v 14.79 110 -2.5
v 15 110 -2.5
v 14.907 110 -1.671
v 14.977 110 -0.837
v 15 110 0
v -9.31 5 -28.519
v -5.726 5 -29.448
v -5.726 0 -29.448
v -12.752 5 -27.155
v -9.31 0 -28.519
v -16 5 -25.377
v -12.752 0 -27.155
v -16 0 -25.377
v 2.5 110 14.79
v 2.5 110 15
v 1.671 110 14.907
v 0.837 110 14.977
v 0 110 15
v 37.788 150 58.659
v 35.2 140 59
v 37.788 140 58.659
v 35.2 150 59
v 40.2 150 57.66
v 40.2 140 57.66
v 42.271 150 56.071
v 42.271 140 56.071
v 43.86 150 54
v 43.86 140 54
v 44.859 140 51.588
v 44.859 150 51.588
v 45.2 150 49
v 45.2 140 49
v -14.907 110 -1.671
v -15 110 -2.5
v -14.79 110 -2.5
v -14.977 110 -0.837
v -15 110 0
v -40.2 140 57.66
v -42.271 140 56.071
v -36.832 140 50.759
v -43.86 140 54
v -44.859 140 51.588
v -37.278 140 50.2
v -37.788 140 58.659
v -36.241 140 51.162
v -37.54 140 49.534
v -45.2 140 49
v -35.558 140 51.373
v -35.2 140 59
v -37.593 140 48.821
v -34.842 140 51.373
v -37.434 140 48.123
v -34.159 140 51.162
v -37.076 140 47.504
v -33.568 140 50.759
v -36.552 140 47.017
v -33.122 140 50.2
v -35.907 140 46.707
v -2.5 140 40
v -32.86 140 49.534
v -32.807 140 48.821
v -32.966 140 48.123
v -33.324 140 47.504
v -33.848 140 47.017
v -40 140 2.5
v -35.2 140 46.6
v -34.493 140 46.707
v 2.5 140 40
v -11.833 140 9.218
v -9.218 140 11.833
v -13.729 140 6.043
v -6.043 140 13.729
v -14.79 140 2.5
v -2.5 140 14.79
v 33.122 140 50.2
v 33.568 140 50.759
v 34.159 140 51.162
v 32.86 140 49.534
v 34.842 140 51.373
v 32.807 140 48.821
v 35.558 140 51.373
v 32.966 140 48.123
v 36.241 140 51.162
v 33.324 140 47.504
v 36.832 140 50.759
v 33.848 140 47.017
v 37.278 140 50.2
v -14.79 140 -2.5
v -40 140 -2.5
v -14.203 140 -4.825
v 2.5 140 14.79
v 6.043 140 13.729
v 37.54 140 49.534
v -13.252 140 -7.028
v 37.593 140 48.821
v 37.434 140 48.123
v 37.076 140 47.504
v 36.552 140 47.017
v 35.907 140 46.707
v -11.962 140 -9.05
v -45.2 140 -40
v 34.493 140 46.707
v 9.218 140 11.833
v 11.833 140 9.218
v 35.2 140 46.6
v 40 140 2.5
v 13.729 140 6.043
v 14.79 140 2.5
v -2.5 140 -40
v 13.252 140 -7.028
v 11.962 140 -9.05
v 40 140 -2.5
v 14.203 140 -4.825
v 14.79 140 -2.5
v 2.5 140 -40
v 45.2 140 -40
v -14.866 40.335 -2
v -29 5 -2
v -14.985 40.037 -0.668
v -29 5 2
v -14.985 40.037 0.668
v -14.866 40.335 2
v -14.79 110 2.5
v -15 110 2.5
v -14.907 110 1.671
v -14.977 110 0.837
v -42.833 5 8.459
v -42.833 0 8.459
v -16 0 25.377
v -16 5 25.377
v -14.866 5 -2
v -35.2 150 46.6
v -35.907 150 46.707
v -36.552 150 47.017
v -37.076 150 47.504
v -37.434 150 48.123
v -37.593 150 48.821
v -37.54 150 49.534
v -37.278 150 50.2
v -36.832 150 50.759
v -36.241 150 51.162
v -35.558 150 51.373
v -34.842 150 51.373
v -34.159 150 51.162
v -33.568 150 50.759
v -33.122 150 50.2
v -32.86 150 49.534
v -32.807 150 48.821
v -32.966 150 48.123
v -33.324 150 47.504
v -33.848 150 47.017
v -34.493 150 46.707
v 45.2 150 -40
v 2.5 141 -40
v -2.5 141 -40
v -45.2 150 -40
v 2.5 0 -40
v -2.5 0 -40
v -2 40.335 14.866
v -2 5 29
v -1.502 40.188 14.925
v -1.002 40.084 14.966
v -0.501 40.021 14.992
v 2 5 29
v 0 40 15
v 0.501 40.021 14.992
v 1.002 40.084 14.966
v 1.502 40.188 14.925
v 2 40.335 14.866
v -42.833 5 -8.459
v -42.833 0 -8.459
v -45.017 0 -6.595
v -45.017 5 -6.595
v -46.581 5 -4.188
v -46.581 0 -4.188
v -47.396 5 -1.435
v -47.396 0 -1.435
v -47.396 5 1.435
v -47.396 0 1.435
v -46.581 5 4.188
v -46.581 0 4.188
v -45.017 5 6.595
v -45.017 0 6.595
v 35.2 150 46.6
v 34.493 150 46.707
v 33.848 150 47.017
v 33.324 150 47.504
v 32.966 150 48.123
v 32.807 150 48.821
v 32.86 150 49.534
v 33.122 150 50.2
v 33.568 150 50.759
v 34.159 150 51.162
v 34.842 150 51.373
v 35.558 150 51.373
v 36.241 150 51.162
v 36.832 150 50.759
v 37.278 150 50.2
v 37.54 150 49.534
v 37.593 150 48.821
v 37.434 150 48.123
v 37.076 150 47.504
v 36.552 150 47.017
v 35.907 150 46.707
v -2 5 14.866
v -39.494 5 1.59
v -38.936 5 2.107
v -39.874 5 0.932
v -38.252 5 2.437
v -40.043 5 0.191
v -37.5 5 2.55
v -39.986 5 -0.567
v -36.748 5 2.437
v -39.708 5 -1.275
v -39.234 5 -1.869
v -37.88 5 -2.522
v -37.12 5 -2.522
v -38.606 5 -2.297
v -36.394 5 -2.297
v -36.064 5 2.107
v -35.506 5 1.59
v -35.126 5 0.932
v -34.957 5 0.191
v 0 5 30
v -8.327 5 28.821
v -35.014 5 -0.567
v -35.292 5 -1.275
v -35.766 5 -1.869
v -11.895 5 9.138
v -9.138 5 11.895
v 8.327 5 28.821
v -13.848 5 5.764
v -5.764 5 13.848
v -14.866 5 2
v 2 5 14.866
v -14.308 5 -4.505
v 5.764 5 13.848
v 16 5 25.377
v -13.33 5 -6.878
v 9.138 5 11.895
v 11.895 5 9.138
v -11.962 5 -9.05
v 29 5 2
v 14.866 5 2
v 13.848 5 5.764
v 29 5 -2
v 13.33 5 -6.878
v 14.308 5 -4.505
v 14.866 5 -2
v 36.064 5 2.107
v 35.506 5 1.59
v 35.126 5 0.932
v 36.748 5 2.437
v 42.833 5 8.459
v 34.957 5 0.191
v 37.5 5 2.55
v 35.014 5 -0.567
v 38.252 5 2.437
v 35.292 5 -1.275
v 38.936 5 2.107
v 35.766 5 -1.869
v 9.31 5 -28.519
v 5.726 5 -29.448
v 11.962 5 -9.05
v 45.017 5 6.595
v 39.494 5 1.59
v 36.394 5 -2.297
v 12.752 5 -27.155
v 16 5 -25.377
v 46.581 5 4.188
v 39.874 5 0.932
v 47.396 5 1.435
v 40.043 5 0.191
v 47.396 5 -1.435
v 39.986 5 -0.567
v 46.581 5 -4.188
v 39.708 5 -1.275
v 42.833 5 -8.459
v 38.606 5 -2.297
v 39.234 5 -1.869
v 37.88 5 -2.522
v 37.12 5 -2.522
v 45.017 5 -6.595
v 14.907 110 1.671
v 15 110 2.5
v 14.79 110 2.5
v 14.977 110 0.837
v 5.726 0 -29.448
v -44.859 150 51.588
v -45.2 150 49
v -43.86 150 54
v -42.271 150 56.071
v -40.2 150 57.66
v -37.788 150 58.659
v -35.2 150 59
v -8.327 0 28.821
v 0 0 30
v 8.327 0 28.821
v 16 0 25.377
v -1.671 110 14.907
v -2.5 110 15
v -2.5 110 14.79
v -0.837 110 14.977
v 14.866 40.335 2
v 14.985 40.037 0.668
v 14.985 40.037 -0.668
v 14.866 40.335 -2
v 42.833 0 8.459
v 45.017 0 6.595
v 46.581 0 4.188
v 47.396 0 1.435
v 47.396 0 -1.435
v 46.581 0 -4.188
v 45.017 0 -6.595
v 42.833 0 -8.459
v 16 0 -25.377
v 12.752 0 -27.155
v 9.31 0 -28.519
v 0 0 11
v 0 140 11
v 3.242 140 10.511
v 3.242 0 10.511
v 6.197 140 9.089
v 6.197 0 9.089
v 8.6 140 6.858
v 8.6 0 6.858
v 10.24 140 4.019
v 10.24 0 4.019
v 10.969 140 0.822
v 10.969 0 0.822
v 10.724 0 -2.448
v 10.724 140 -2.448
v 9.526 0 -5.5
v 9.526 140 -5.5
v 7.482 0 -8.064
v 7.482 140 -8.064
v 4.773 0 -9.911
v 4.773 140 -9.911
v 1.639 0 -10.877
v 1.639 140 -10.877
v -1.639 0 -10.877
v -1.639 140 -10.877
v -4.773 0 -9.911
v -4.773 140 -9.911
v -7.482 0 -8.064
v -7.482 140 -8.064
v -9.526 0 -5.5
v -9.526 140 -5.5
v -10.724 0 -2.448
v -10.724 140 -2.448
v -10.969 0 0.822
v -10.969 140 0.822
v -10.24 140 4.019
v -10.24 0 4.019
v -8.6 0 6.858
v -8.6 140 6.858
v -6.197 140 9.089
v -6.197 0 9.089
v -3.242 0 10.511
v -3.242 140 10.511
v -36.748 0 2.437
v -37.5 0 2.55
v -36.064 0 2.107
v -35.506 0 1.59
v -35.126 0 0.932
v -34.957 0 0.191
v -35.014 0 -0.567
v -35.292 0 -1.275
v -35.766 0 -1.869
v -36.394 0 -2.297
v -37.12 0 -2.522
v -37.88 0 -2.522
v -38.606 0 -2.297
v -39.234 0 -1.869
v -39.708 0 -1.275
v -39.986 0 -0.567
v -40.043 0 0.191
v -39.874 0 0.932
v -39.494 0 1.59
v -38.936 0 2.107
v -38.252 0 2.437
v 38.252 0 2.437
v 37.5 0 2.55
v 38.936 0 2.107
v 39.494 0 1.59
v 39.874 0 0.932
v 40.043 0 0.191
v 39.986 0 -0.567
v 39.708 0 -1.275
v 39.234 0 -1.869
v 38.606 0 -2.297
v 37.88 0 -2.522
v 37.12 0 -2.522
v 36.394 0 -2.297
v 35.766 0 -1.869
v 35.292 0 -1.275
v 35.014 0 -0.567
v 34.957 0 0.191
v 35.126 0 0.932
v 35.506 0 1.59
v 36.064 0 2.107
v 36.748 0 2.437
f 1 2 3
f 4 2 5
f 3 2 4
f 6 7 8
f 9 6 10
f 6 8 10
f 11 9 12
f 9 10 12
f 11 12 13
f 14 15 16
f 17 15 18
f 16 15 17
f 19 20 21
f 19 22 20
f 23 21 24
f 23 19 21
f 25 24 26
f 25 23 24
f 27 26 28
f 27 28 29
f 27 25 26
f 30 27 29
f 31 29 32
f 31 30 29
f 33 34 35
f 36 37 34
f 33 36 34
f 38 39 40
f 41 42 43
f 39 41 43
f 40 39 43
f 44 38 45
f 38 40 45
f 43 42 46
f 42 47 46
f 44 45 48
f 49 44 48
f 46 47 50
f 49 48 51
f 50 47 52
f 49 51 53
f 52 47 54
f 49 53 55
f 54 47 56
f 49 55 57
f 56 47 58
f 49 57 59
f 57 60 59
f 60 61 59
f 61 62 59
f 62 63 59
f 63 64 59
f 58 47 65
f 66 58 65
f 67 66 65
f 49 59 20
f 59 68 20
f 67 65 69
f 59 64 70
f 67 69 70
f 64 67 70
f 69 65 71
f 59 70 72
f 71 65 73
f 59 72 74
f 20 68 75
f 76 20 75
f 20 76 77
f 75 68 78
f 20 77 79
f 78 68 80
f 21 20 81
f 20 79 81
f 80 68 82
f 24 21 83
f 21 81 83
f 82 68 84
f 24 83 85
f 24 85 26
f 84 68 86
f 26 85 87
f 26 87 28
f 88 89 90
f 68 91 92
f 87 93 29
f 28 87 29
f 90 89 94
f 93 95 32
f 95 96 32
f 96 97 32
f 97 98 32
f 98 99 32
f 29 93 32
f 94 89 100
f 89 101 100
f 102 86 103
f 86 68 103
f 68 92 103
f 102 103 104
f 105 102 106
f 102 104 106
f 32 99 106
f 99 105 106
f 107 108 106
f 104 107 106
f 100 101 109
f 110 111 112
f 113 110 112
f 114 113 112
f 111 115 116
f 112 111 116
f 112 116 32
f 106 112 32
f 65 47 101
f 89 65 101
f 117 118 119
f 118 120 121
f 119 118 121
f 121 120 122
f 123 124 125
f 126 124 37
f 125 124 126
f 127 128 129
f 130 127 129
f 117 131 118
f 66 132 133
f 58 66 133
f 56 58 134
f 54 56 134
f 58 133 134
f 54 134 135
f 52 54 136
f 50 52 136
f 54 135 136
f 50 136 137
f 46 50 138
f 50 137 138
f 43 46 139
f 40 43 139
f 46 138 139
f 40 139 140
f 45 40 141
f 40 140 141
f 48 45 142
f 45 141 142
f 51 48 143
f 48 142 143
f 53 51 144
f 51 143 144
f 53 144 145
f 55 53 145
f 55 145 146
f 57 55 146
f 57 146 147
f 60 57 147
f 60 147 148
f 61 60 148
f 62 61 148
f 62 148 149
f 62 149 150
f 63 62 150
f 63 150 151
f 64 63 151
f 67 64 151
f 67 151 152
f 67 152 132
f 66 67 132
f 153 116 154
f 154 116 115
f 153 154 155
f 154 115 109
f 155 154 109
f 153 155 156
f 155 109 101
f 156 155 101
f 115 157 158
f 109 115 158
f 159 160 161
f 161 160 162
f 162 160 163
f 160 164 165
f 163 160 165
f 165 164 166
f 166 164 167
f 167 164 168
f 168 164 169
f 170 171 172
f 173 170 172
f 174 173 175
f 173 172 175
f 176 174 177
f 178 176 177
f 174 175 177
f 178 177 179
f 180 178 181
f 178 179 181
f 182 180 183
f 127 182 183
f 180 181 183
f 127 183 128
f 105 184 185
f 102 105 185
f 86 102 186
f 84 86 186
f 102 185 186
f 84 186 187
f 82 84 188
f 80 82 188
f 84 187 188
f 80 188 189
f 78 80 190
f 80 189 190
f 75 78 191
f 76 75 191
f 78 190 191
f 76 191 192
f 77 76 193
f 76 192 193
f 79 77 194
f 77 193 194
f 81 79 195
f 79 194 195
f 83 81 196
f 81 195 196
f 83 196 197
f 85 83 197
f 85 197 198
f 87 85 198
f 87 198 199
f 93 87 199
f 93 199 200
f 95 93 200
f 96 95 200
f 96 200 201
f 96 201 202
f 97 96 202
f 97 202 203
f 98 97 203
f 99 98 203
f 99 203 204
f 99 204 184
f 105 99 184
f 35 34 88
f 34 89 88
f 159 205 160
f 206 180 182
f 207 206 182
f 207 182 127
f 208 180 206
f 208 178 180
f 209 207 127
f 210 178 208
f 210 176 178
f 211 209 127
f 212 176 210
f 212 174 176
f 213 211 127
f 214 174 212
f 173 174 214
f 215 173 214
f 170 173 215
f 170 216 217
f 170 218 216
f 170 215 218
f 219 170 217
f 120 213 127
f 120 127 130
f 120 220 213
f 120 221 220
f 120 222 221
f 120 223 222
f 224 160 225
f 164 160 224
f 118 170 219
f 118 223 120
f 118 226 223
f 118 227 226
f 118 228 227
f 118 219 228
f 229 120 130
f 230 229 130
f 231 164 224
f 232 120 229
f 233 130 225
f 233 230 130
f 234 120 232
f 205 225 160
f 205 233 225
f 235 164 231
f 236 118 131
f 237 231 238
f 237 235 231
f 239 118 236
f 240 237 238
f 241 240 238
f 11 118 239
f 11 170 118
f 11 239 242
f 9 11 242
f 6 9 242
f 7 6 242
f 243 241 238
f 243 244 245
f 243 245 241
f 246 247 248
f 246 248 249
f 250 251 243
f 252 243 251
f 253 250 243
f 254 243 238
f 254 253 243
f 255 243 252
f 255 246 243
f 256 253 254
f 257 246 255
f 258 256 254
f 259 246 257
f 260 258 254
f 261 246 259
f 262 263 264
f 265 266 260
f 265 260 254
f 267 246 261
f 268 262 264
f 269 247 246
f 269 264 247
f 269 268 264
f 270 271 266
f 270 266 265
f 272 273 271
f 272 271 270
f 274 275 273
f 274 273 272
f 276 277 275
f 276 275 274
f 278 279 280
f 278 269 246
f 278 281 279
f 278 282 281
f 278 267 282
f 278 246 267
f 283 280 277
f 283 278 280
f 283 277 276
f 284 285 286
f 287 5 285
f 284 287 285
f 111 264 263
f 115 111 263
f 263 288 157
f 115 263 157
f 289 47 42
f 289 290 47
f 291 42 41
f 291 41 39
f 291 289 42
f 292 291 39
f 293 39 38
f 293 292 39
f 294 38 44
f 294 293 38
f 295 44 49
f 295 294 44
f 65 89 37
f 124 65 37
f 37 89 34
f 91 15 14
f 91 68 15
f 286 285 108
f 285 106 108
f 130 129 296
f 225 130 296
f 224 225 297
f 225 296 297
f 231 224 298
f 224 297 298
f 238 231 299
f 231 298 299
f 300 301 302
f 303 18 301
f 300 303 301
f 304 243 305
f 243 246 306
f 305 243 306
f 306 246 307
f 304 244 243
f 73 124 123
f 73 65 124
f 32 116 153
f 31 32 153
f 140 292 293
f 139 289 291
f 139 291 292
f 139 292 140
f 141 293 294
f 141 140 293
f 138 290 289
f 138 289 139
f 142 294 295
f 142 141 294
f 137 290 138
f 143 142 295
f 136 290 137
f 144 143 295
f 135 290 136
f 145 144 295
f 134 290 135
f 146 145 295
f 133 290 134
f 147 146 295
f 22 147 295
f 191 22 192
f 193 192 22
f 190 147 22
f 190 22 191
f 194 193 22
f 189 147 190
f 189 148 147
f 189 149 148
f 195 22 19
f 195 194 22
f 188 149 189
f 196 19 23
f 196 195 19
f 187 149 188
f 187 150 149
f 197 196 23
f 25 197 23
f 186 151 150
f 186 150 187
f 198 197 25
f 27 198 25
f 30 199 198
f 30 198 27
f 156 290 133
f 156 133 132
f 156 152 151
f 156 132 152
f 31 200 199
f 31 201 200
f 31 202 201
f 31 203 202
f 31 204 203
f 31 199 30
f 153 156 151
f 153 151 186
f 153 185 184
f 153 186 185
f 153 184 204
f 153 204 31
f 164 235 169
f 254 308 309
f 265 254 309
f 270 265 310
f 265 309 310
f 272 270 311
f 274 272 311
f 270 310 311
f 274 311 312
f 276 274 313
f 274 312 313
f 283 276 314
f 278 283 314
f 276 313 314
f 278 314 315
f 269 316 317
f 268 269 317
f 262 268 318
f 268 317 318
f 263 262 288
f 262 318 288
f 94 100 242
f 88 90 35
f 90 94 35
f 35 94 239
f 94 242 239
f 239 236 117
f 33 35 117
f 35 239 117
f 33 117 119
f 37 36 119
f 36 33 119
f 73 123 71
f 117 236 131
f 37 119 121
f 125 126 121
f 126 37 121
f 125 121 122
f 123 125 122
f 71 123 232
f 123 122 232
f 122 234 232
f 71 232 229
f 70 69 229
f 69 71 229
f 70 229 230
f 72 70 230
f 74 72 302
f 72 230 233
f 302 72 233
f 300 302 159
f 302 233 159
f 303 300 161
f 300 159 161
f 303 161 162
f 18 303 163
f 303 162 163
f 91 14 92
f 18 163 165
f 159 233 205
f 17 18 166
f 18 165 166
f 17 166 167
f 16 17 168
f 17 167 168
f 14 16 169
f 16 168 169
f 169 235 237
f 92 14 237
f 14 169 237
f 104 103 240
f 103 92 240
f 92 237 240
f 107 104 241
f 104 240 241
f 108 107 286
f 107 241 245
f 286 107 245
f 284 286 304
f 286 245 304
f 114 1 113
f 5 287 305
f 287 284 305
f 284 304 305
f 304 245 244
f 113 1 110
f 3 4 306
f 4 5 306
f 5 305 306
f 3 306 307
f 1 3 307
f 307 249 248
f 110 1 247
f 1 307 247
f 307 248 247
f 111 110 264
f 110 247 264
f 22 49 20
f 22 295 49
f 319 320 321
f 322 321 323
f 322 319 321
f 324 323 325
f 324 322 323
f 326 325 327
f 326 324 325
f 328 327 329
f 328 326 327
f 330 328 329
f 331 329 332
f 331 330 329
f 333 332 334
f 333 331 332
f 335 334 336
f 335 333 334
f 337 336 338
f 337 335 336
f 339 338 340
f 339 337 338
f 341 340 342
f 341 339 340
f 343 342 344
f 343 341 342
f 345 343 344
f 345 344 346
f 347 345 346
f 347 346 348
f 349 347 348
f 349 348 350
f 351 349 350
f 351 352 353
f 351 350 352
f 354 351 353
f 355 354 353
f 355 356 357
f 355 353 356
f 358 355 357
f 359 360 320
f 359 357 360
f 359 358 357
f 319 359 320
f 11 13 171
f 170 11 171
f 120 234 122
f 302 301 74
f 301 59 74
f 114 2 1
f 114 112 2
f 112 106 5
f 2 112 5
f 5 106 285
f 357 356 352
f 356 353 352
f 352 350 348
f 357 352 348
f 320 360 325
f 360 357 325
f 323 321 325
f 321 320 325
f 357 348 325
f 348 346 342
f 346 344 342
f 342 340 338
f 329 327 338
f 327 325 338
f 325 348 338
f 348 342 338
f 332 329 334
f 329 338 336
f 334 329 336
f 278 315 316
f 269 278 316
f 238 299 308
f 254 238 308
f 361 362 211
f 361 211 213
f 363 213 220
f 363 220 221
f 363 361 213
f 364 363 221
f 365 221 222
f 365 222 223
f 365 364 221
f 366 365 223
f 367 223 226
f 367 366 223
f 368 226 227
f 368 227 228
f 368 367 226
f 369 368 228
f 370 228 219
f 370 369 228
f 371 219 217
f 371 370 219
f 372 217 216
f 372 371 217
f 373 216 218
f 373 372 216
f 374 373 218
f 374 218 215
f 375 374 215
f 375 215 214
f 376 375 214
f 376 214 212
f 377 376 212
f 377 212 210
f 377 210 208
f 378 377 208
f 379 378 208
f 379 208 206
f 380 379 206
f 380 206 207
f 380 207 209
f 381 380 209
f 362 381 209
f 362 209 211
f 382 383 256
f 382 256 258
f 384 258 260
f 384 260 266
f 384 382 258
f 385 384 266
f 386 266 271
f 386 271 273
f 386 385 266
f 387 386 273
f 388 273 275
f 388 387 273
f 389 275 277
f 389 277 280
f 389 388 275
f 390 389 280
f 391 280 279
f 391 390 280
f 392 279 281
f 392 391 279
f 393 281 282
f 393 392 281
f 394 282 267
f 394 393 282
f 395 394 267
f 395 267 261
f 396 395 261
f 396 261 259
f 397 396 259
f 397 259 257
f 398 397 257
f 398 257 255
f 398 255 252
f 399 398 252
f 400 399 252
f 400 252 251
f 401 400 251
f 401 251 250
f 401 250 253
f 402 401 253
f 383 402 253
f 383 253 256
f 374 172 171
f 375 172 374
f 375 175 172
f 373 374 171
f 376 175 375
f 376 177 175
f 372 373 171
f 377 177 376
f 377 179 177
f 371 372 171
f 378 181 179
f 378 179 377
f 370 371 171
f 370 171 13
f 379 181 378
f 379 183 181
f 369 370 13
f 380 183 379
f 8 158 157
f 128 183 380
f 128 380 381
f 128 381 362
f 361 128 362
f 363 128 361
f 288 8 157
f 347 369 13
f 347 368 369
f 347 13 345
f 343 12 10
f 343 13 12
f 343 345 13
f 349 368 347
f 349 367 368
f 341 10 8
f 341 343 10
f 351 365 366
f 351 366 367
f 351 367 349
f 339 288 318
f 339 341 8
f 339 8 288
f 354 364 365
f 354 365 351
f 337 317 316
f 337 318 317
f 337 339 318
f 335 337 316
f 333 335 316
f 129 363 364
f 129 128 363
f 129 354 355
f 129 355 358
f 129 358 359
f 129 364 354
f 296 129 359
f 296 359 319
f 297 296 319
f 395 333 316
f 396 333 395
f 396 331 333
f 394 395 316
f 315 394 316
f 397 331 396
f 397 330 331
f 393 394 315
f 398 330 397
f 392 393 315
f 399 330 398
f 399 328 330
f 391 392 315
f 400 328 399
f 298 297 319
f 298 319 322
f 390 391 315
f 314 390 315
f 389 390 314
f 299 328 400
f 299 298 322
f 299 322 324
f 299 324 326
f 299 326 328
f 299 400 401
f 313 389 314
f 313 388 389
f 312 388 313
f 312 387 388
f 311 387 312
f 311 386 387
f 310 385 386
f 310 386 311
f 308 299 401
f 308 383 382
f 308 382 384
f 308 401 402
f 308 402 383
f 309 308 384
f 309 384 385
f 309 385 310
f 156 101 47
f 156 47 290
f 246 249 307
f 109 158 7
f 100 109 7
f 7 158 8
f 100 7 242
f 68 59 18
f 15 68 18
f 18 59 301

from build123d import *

# Parameters (mm, degrees)
SKETCH1_R                      = 2.55
SKETCH1_R_2                    = 11
BASE_DEPTH                     = 5
SKETCH1_3_R                    = 15
SKETCH1_3_R_2                  = 11
STEM_DEPTH                     = 150
RIBS_DEPTH                     = 2
CIRPATTERN1_COUNT              = 4
SKETCH4_W                      = 90.4
SKETCH4_H                      = 80
TOP_PLATE_DEPTH                = 10
SKETCH6_W                      = 90.4
SKETCH6_H                      = 10
BOSS_EXTRUDE7_DEPTH            = 19
RIB1_START                     = -2.5
RIB1_DEPTH                     = 5
CIRPATTERN6_COUNT              = 4
CUT_EXTRUDE1_REACH             = 170.039
SKETCH10_R                     = 2.4
CUT_EXTRUDE1_DIRECTION_2_DEPTH = 169.039429897
FILLET1_R                      = 10
FILLET2_R                      = 10
SKETCH13_W                     = 5
SKETCH13_H                     = 25.209800542
BOSS_EXTRUDE10_DEPTH           = 140
BOSS_EXTRUDE11_DEPTH           = 141
BOSS_EXTRUDE11_START           = -9.462383487
BOSS_EXTRUDE11_2_DEPTH         = 9.462383487
BOSS_EXTRUDE11_START_2         = -22
BOSS_EXTRUDE11_3_OUTLINE_W     = 26
BOSS_EXTRUDE11_3_OUTLINE_H     = 36
BOSS_EXTRUDE11_3_DEPTH         = 10.305131811
SKETCH16_W                     = 125.849741583
SKETCH16_H                     = 86.760976346
CUT_EXTRUDE2_DEPTH             = 169.039429897


with BuildPart() as part:
    # Sketch1 → base (new body)
    with BuildSketch(Plane(origin=(0, 0, 0), x_dir=(1, 0, 0), z_dir=(0, 1, 0))):
        with BuildLine():
            Line((-16, 25.377155081), (-42.833333333, 8.459051694))
            ThreePointArc((-42.833333333, 8.459051694), (-47.5, 0), (-42.833333333, -8.459051694))
            Line((-42.833333333, -8.459051694), (-16, -25.377155081))
            ThreePointArc((-16, -25.377155081), (0, -30), (16, -25.377155081))
            Line((16, -25.377155081), (42.833333333, -8.459051694))
            ThreePointArc((42.833333333, -8.459051694), (47.5, 0), (42.833333333, 8.459051694))
            Line((42.833333333, 8.459051694), (16, 25.377155081))
            ThreePointArc((16, 25.377155081), (0, 30), (-16, 25.377155081))
        make_face()
        with Locations(Location((-37.5, 0, 0), (0, 0, 270))):
            Circle(SKETCH1_R, mode=Mode.SUBTRACT)
        with Locations(Location((37.5, 0, 0), (0, 0, 270))):
            Circle(SKETCH1_R, mode=Mode.SUBTRACT)
        with Locations(Location((0, 0, 0), (0, 0, 270))):
            Circle(SKETCH1_R_2, mode=Mode.SUBTRACT)
    extrude(amount=BASE_DEPTH)

    # Sketch1<3> → stem (add)
    with BuildSketch(Plane(origin=(0, 0, 0), x_dir=(1, 0, 0), z_dir=(0, 1, 0))):
        with Locations(Location((0, 0, 0), (0, 0, 270))):
            Circle(SKETCH1_3_R)
        with Locations(Location((0, 0, 0), (0, 0, 270))):
            Circle(SKETCH1_3_R_2, mode=Mode.SUBTRACT)
    extrude(amount=STEM_DEPTH)

    # Sketch2 → ribs (add, symmetric)
    with BuildSketch(Plane(origin=(0, 0, 0), x_dir=(0, 0, -1), z_dir=(1, 0, 0))):
        Polygon((-13, 5), (-29, 5), (-13, 45), align=None)
    ribs = extrude(amount=RIBS_DEPTH, both=True)

    # CirPattern1: ribs ×4 about axis
    cirpattern1_axis = Axis((0, 0, 0), (0, 1, 0))
    for i in range(1, CIRPATTERN1_COUNT):
        add(ribs.rotate(cirpattern1_axis, i * 360 / CIRPATTERN1_COUNT))

    # Sketch4 → top plate (add)
    with BuildSketch(Plane(origin=(0, 150, 0), x_dir=(1, 0, 0), z_dir=(0, 1, 0))):
        Rectangle(SKETCH4_W, SKETCH4_H)
    extrude(amount=-TOP_PLATE_DEPTH)

    # Sketch6 → Boss-Extrude7 (add)
    with BuildSketch(Plane.XY.offset(40)):
        with Locations((0, 145)):
            Rectangle(SKETCH6_W, SKETCH6_H)
    extrude(amount=BOSS_EXTRUDE7_DEPTH)

    # Rib1: read off the stored shape, not the designer's step
    # Rib1 outline → Rib1 (add)
    with BuildSketch(Plane(origin=(0, 0, 0), x_dir=(0, 0, -1), z_dir=(1, 0, 0)).offset(RIB1_START)):
        Polygon((-15, 110), (-14.790199458, 110), (-14.790199458, 140), (-40, 140), align=None)
    rib1 = extrude(amount=RIB1_DEPTH)

    # CirPattern6: Rib1 ×4 about axis
    cirpattern6_axis = Axis((0, 0, 0), (0, 1, 0))
    for i in range(1, CIRPATTERN6_COUNT):
        add(rib1.rotate(cirpattern6_axis, i * 360 / CIRPATTERN6_COUNT))

    # Sketch10 → Cut-Extrude1 (cut, up to next)
    with BuildSketch(Plane(origin=(0, 150, 0), x_dir=(1, 0, 0), z_dir=(0, 1, 0)), mode=Mode.PRIVATE) as cut_extrude1_sk1:
        with Locations(Location((35.2, -49, 0), (0, 0, 90))):
            Circle(SKETCH10_R)
    cut_extrude1_tool1 = extrude(cut_extrude1_sk1.sketch, amount=-CUT_EXTRUDE1_REACH, mode=Mode.PRIVATE) & part.part
    # Sketch10 → Cut-Extrude1 (cut, up to next)
    with BuildSketch(Plane(origin=(0, 150, 0), x_dir=(1, 0, 0), z_dir=(0, 1, 0)), mode=Mode.PRIVATE) as cut_extrude1_sk2:
        with Locations(Location((-35.2, -49, 0), (0, 0, 90))):
            Circle(SKETCH10_R)
    cut_extrude1_tool2 = extrude(cut_extrude1_sk2.sketch, amount=-CUT_EXTRUDE1_REACH, mode=Mode.PRIVATE) & part.part
    add(cut_extrude1_tool1.solids().sort_by_distance((35.2, 150, 49))[0], mode=Mode.SUBTRACT)
    add(cut_extrude1_tool2.solids().sort_by_distance((-35.2, 150, 49))[0], mode=Mode.SUBTRACT)

    # Sketch10 → Cut-Extrude1 direction 2 (cut)
    with BuildSketch(Plane(origin=(0, 150, 0), x_dir=(1, 0, 0), z_dir=(0, 1, 0))):
        with Locations(Location((35.2, -49, 0), (0, 0, 90))):
            Circle(SKETCH10_R)
        with Locations(Location((-35.2, -49, 0), (0, 0, 90))):
            Circle(SKETCH10_R)
    extrude(amount=CUT_EXTRUDE1_DIRECTION_2_DEPTH, mode=Mode.SUBTRACT)

    # Fillet1
    fillet1_edges = [part.edges().sort_by_distance(p)[0] for p in [
        (-45.2, 145, 59),
    ]]
    fillet(fillet1_edges, radius=FILLET1_R)

    # Fillet2
    fillet2_edges = [part.edges().sort_by_distance(p)[0] for p in [
        (45.2, 145, 59),
    ]]
    fillet(fillet2_edges, radius=FILLET2_R)

    # Sketch13 → Boss-Extrude10 (add, through all)
    with BuildSketch(Plane.XZ.offset(-140)):
        with Locations((0, -27.395099729)):
            Rectangle(SKETCH13_W, SKETCH13_H)
    extrude(amount=BOSS_EXTRUDE10_DEPTH)

    # Boss-Extrude11: read off the stored shape, not the designer's step
    # Boss-Extrude11 outline → Boss-Extrude11 (add)
    with BuildSketch(Plane(origin=(0, 0, 0), x_dir=(1, 0, 0), z_dir=(0, 1, 0))):
        with BuildLine():
            ThreePointArc((2.5, 14.790199458), (7.779960403, 12.824672164), (11.962383487, 9.049938193))
            Line((11.962383487, 9.049938193), (2.5, 40))
            Line((2.5, 40), (2.5, 14.790199458))
        make_face()
        with BuildLine():
            ThreePointArc((-11.962383487, 9.049938193), (-7.779960403, 12.824672164), (-2.5, 14.790199458))
            Line((-2.5, 14.790199458), (-2.5, 40))
            Line((-2.5, 40), (-11.962383487, 9.049938193))
        make_face()
    extrude(amount=BOSS_EXTRUDE11_DEPTH)

    # Boss-Extrude11 2 outline → Boss-Extrude11 2 (add)
    with BuildSketch(Plane(origin=(0, 0, 0), x_dir=(1, 0, 0), z_dir=(0, 1, 0)).offset(BOSS_EXTRUDE11_START)):
        with BuildLine():
            Line((-2.5, 40), (-11.962383487, 9.049938193))
            ThreePointArc((-11.962383487, 9.049938193), (0, 15), (11.962383487, 9.049938193))
            Line((11.962383487, 9.049938193), (2.5, 40))
            Line((2.5, 40), (-2.5, 40))
        make_face()
    extrude(amount=BOSS_EXTRUDE11_2_DEPTH)

    # Boss-Extrude11 3 outline → Boss-Extrude11 3 (cut)
    with BuildSketch(Plane(origin=(0, 0, 0), x_dir=(1, 0, 0), z_dir=(0, 0.9563047559630354, 0.2923717047227371)).offset(BOSS_EXTRUDE11_START_2)):
        with Locations((0, 22)):
            Rectangle(BOSS_EXTRUDE11_3_OUTLINE_W, BOSS_EXTRUDE11_3_OUTLINE_H)
    extrude(amount=BOSS_EXTRUDE11_3_DEPTH, mode=Mode.SUBTRACT)

    # Sketch16 → Cut-Extrude2 (cut, through all)
    with BuildSketch(Plane.XY):
        with Locations((6.783470695, -43.380488173)):
            Rectangle(SKETCH16_W, SKETCH16_H)
    extrude(amount=-CUT_EXTRUDE2_DEPTH, mode=Mode.SUBTRACT)


solid = part.part
